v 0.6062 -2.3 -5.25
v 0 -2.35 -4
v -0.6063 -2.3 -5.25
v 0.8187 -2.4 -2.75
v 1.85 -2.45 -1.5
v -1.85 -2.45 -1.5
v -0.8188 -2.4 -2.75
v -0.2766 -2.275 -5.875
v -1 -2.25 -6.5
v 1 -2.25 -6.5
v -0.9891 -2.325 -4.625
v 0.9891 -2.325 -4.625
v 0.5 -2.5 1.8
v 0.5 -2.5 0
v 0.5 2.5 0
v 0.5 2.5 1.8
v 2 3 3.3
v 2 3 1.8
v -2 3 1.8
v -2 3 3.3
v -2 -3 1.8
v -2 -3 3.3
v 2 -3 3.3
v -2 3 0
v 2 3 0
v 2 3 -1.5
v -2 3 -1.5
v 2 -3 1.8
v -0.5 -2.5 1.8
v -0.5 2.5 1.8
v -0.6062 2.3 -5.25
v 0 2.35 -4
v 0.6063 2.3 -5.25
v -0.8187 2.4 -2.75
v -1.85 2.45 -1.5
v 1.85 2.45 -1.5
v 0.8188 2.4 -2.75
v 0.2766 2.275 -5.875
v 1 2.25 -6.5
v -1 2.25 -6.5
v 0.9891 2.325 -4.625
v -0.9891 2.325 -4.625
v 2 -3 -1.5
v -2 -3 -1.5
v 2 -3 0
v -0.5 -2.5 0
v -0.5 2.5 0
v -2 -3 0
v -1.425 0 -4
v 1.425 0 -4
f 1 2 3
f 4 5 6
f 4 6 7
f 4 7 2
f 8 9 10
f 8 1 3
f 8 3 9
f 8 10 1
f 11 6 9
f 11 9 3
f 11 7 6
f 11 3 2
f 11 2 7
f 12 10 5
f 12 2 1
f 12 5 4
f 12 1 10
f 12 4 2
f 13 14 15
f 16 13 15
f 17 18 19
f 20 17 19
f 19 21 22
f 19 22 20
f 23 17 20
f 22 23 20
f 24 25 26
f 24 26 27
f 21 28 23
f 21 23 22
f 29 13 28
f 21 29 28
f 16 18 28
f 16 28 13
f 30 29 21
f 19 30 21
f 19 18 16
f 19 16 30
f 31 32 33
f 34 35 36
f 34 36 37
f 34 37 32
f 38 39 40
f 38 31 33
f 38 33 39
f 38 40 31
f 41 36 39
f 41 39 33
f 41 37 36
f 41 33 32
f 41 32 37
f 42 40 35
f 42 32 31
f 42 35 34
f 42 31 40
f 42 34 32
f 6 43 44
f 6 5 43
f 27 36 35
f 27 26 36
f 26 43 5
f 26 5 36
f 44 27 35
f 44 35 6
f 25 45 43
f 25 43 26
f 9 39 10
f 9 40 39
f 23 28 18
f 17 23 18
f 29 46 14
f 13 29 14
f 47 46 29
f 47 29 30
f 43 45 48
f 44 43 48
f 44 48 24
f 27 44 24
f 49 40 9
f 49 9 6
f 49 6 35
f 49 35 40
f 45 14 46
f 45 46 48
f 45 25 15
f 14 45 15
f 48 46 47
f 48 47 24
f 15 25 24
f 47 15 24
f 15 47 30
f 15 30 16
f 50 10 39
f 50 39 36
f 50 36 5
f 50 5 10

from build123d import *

# Parameters (mm, degrees)
SKETCH_2_W      = 1
SKETCH_2_H      = 5
EXTRUDE_1_DEPTH = 1.8
SKETCH_3_W      = 4
SKETCH_3_H      = 6
EXTRUDE_2_DEPTH = 1.5


with BuildPart() as part:
    # 草圖2 → 伸長1 (new body)
    with BuildSketch(Plane.XY):
        Rectangle(SKETCH_2_W, SKETCH_2_H)
    extrude(amount=EXTRUDE_1_DEPTH)

    # 草圖3 → 伸長2 (add)
    with BuildSketch(Plane(origin=(0, 0, 0), x_dir=(-1, 0, 0), z_dir=(0, 0, -1))):
        Rectangle(SKETCH_3_W, SKETCH_3_H)
    extrude_2 = extrude(amount=EXTRUDE_2_DEPTH)

    # 鏡射1: 伸長2 across plane
    add(extrude_2.mirror(Plane.XY.offset(0.9)))

    # 草圖4 → 疊層拉伸1 section 0
    with BuildSketch(Plane(origin=(0, 0, -6.5), x_dir=(-1, 0, 0), z_dir=(0, 0, -1))):
        with BuildLine():
            Line((-1, 2.25), (1, 2.25))
            Line((1, 2.25), (1, -2.25))
            Line((1, -2.25), (-1, -2.25))
            Line((-1, -2.25), (-1, 2.25))
        make_face()
    # 草圖5 → 疊層拉伸1 section 1
    with BuildSketch(Plane(origin=(0, 0, -1.5), x_dir=(-1, 0, 0), z_dir=(0, 0, -1))):
        with BuildLine():
            Line((-1.85, 2.45), (1.85, 2.45))
            Line((1.85, 2.45), (1.85, -2.45))
            Line((1.85, -2.45), (-1.85, -2.45))
            Line((-1.85, -2.45), (-1.85, 2.45))
        make_face()
    loft()


solid = part.part
